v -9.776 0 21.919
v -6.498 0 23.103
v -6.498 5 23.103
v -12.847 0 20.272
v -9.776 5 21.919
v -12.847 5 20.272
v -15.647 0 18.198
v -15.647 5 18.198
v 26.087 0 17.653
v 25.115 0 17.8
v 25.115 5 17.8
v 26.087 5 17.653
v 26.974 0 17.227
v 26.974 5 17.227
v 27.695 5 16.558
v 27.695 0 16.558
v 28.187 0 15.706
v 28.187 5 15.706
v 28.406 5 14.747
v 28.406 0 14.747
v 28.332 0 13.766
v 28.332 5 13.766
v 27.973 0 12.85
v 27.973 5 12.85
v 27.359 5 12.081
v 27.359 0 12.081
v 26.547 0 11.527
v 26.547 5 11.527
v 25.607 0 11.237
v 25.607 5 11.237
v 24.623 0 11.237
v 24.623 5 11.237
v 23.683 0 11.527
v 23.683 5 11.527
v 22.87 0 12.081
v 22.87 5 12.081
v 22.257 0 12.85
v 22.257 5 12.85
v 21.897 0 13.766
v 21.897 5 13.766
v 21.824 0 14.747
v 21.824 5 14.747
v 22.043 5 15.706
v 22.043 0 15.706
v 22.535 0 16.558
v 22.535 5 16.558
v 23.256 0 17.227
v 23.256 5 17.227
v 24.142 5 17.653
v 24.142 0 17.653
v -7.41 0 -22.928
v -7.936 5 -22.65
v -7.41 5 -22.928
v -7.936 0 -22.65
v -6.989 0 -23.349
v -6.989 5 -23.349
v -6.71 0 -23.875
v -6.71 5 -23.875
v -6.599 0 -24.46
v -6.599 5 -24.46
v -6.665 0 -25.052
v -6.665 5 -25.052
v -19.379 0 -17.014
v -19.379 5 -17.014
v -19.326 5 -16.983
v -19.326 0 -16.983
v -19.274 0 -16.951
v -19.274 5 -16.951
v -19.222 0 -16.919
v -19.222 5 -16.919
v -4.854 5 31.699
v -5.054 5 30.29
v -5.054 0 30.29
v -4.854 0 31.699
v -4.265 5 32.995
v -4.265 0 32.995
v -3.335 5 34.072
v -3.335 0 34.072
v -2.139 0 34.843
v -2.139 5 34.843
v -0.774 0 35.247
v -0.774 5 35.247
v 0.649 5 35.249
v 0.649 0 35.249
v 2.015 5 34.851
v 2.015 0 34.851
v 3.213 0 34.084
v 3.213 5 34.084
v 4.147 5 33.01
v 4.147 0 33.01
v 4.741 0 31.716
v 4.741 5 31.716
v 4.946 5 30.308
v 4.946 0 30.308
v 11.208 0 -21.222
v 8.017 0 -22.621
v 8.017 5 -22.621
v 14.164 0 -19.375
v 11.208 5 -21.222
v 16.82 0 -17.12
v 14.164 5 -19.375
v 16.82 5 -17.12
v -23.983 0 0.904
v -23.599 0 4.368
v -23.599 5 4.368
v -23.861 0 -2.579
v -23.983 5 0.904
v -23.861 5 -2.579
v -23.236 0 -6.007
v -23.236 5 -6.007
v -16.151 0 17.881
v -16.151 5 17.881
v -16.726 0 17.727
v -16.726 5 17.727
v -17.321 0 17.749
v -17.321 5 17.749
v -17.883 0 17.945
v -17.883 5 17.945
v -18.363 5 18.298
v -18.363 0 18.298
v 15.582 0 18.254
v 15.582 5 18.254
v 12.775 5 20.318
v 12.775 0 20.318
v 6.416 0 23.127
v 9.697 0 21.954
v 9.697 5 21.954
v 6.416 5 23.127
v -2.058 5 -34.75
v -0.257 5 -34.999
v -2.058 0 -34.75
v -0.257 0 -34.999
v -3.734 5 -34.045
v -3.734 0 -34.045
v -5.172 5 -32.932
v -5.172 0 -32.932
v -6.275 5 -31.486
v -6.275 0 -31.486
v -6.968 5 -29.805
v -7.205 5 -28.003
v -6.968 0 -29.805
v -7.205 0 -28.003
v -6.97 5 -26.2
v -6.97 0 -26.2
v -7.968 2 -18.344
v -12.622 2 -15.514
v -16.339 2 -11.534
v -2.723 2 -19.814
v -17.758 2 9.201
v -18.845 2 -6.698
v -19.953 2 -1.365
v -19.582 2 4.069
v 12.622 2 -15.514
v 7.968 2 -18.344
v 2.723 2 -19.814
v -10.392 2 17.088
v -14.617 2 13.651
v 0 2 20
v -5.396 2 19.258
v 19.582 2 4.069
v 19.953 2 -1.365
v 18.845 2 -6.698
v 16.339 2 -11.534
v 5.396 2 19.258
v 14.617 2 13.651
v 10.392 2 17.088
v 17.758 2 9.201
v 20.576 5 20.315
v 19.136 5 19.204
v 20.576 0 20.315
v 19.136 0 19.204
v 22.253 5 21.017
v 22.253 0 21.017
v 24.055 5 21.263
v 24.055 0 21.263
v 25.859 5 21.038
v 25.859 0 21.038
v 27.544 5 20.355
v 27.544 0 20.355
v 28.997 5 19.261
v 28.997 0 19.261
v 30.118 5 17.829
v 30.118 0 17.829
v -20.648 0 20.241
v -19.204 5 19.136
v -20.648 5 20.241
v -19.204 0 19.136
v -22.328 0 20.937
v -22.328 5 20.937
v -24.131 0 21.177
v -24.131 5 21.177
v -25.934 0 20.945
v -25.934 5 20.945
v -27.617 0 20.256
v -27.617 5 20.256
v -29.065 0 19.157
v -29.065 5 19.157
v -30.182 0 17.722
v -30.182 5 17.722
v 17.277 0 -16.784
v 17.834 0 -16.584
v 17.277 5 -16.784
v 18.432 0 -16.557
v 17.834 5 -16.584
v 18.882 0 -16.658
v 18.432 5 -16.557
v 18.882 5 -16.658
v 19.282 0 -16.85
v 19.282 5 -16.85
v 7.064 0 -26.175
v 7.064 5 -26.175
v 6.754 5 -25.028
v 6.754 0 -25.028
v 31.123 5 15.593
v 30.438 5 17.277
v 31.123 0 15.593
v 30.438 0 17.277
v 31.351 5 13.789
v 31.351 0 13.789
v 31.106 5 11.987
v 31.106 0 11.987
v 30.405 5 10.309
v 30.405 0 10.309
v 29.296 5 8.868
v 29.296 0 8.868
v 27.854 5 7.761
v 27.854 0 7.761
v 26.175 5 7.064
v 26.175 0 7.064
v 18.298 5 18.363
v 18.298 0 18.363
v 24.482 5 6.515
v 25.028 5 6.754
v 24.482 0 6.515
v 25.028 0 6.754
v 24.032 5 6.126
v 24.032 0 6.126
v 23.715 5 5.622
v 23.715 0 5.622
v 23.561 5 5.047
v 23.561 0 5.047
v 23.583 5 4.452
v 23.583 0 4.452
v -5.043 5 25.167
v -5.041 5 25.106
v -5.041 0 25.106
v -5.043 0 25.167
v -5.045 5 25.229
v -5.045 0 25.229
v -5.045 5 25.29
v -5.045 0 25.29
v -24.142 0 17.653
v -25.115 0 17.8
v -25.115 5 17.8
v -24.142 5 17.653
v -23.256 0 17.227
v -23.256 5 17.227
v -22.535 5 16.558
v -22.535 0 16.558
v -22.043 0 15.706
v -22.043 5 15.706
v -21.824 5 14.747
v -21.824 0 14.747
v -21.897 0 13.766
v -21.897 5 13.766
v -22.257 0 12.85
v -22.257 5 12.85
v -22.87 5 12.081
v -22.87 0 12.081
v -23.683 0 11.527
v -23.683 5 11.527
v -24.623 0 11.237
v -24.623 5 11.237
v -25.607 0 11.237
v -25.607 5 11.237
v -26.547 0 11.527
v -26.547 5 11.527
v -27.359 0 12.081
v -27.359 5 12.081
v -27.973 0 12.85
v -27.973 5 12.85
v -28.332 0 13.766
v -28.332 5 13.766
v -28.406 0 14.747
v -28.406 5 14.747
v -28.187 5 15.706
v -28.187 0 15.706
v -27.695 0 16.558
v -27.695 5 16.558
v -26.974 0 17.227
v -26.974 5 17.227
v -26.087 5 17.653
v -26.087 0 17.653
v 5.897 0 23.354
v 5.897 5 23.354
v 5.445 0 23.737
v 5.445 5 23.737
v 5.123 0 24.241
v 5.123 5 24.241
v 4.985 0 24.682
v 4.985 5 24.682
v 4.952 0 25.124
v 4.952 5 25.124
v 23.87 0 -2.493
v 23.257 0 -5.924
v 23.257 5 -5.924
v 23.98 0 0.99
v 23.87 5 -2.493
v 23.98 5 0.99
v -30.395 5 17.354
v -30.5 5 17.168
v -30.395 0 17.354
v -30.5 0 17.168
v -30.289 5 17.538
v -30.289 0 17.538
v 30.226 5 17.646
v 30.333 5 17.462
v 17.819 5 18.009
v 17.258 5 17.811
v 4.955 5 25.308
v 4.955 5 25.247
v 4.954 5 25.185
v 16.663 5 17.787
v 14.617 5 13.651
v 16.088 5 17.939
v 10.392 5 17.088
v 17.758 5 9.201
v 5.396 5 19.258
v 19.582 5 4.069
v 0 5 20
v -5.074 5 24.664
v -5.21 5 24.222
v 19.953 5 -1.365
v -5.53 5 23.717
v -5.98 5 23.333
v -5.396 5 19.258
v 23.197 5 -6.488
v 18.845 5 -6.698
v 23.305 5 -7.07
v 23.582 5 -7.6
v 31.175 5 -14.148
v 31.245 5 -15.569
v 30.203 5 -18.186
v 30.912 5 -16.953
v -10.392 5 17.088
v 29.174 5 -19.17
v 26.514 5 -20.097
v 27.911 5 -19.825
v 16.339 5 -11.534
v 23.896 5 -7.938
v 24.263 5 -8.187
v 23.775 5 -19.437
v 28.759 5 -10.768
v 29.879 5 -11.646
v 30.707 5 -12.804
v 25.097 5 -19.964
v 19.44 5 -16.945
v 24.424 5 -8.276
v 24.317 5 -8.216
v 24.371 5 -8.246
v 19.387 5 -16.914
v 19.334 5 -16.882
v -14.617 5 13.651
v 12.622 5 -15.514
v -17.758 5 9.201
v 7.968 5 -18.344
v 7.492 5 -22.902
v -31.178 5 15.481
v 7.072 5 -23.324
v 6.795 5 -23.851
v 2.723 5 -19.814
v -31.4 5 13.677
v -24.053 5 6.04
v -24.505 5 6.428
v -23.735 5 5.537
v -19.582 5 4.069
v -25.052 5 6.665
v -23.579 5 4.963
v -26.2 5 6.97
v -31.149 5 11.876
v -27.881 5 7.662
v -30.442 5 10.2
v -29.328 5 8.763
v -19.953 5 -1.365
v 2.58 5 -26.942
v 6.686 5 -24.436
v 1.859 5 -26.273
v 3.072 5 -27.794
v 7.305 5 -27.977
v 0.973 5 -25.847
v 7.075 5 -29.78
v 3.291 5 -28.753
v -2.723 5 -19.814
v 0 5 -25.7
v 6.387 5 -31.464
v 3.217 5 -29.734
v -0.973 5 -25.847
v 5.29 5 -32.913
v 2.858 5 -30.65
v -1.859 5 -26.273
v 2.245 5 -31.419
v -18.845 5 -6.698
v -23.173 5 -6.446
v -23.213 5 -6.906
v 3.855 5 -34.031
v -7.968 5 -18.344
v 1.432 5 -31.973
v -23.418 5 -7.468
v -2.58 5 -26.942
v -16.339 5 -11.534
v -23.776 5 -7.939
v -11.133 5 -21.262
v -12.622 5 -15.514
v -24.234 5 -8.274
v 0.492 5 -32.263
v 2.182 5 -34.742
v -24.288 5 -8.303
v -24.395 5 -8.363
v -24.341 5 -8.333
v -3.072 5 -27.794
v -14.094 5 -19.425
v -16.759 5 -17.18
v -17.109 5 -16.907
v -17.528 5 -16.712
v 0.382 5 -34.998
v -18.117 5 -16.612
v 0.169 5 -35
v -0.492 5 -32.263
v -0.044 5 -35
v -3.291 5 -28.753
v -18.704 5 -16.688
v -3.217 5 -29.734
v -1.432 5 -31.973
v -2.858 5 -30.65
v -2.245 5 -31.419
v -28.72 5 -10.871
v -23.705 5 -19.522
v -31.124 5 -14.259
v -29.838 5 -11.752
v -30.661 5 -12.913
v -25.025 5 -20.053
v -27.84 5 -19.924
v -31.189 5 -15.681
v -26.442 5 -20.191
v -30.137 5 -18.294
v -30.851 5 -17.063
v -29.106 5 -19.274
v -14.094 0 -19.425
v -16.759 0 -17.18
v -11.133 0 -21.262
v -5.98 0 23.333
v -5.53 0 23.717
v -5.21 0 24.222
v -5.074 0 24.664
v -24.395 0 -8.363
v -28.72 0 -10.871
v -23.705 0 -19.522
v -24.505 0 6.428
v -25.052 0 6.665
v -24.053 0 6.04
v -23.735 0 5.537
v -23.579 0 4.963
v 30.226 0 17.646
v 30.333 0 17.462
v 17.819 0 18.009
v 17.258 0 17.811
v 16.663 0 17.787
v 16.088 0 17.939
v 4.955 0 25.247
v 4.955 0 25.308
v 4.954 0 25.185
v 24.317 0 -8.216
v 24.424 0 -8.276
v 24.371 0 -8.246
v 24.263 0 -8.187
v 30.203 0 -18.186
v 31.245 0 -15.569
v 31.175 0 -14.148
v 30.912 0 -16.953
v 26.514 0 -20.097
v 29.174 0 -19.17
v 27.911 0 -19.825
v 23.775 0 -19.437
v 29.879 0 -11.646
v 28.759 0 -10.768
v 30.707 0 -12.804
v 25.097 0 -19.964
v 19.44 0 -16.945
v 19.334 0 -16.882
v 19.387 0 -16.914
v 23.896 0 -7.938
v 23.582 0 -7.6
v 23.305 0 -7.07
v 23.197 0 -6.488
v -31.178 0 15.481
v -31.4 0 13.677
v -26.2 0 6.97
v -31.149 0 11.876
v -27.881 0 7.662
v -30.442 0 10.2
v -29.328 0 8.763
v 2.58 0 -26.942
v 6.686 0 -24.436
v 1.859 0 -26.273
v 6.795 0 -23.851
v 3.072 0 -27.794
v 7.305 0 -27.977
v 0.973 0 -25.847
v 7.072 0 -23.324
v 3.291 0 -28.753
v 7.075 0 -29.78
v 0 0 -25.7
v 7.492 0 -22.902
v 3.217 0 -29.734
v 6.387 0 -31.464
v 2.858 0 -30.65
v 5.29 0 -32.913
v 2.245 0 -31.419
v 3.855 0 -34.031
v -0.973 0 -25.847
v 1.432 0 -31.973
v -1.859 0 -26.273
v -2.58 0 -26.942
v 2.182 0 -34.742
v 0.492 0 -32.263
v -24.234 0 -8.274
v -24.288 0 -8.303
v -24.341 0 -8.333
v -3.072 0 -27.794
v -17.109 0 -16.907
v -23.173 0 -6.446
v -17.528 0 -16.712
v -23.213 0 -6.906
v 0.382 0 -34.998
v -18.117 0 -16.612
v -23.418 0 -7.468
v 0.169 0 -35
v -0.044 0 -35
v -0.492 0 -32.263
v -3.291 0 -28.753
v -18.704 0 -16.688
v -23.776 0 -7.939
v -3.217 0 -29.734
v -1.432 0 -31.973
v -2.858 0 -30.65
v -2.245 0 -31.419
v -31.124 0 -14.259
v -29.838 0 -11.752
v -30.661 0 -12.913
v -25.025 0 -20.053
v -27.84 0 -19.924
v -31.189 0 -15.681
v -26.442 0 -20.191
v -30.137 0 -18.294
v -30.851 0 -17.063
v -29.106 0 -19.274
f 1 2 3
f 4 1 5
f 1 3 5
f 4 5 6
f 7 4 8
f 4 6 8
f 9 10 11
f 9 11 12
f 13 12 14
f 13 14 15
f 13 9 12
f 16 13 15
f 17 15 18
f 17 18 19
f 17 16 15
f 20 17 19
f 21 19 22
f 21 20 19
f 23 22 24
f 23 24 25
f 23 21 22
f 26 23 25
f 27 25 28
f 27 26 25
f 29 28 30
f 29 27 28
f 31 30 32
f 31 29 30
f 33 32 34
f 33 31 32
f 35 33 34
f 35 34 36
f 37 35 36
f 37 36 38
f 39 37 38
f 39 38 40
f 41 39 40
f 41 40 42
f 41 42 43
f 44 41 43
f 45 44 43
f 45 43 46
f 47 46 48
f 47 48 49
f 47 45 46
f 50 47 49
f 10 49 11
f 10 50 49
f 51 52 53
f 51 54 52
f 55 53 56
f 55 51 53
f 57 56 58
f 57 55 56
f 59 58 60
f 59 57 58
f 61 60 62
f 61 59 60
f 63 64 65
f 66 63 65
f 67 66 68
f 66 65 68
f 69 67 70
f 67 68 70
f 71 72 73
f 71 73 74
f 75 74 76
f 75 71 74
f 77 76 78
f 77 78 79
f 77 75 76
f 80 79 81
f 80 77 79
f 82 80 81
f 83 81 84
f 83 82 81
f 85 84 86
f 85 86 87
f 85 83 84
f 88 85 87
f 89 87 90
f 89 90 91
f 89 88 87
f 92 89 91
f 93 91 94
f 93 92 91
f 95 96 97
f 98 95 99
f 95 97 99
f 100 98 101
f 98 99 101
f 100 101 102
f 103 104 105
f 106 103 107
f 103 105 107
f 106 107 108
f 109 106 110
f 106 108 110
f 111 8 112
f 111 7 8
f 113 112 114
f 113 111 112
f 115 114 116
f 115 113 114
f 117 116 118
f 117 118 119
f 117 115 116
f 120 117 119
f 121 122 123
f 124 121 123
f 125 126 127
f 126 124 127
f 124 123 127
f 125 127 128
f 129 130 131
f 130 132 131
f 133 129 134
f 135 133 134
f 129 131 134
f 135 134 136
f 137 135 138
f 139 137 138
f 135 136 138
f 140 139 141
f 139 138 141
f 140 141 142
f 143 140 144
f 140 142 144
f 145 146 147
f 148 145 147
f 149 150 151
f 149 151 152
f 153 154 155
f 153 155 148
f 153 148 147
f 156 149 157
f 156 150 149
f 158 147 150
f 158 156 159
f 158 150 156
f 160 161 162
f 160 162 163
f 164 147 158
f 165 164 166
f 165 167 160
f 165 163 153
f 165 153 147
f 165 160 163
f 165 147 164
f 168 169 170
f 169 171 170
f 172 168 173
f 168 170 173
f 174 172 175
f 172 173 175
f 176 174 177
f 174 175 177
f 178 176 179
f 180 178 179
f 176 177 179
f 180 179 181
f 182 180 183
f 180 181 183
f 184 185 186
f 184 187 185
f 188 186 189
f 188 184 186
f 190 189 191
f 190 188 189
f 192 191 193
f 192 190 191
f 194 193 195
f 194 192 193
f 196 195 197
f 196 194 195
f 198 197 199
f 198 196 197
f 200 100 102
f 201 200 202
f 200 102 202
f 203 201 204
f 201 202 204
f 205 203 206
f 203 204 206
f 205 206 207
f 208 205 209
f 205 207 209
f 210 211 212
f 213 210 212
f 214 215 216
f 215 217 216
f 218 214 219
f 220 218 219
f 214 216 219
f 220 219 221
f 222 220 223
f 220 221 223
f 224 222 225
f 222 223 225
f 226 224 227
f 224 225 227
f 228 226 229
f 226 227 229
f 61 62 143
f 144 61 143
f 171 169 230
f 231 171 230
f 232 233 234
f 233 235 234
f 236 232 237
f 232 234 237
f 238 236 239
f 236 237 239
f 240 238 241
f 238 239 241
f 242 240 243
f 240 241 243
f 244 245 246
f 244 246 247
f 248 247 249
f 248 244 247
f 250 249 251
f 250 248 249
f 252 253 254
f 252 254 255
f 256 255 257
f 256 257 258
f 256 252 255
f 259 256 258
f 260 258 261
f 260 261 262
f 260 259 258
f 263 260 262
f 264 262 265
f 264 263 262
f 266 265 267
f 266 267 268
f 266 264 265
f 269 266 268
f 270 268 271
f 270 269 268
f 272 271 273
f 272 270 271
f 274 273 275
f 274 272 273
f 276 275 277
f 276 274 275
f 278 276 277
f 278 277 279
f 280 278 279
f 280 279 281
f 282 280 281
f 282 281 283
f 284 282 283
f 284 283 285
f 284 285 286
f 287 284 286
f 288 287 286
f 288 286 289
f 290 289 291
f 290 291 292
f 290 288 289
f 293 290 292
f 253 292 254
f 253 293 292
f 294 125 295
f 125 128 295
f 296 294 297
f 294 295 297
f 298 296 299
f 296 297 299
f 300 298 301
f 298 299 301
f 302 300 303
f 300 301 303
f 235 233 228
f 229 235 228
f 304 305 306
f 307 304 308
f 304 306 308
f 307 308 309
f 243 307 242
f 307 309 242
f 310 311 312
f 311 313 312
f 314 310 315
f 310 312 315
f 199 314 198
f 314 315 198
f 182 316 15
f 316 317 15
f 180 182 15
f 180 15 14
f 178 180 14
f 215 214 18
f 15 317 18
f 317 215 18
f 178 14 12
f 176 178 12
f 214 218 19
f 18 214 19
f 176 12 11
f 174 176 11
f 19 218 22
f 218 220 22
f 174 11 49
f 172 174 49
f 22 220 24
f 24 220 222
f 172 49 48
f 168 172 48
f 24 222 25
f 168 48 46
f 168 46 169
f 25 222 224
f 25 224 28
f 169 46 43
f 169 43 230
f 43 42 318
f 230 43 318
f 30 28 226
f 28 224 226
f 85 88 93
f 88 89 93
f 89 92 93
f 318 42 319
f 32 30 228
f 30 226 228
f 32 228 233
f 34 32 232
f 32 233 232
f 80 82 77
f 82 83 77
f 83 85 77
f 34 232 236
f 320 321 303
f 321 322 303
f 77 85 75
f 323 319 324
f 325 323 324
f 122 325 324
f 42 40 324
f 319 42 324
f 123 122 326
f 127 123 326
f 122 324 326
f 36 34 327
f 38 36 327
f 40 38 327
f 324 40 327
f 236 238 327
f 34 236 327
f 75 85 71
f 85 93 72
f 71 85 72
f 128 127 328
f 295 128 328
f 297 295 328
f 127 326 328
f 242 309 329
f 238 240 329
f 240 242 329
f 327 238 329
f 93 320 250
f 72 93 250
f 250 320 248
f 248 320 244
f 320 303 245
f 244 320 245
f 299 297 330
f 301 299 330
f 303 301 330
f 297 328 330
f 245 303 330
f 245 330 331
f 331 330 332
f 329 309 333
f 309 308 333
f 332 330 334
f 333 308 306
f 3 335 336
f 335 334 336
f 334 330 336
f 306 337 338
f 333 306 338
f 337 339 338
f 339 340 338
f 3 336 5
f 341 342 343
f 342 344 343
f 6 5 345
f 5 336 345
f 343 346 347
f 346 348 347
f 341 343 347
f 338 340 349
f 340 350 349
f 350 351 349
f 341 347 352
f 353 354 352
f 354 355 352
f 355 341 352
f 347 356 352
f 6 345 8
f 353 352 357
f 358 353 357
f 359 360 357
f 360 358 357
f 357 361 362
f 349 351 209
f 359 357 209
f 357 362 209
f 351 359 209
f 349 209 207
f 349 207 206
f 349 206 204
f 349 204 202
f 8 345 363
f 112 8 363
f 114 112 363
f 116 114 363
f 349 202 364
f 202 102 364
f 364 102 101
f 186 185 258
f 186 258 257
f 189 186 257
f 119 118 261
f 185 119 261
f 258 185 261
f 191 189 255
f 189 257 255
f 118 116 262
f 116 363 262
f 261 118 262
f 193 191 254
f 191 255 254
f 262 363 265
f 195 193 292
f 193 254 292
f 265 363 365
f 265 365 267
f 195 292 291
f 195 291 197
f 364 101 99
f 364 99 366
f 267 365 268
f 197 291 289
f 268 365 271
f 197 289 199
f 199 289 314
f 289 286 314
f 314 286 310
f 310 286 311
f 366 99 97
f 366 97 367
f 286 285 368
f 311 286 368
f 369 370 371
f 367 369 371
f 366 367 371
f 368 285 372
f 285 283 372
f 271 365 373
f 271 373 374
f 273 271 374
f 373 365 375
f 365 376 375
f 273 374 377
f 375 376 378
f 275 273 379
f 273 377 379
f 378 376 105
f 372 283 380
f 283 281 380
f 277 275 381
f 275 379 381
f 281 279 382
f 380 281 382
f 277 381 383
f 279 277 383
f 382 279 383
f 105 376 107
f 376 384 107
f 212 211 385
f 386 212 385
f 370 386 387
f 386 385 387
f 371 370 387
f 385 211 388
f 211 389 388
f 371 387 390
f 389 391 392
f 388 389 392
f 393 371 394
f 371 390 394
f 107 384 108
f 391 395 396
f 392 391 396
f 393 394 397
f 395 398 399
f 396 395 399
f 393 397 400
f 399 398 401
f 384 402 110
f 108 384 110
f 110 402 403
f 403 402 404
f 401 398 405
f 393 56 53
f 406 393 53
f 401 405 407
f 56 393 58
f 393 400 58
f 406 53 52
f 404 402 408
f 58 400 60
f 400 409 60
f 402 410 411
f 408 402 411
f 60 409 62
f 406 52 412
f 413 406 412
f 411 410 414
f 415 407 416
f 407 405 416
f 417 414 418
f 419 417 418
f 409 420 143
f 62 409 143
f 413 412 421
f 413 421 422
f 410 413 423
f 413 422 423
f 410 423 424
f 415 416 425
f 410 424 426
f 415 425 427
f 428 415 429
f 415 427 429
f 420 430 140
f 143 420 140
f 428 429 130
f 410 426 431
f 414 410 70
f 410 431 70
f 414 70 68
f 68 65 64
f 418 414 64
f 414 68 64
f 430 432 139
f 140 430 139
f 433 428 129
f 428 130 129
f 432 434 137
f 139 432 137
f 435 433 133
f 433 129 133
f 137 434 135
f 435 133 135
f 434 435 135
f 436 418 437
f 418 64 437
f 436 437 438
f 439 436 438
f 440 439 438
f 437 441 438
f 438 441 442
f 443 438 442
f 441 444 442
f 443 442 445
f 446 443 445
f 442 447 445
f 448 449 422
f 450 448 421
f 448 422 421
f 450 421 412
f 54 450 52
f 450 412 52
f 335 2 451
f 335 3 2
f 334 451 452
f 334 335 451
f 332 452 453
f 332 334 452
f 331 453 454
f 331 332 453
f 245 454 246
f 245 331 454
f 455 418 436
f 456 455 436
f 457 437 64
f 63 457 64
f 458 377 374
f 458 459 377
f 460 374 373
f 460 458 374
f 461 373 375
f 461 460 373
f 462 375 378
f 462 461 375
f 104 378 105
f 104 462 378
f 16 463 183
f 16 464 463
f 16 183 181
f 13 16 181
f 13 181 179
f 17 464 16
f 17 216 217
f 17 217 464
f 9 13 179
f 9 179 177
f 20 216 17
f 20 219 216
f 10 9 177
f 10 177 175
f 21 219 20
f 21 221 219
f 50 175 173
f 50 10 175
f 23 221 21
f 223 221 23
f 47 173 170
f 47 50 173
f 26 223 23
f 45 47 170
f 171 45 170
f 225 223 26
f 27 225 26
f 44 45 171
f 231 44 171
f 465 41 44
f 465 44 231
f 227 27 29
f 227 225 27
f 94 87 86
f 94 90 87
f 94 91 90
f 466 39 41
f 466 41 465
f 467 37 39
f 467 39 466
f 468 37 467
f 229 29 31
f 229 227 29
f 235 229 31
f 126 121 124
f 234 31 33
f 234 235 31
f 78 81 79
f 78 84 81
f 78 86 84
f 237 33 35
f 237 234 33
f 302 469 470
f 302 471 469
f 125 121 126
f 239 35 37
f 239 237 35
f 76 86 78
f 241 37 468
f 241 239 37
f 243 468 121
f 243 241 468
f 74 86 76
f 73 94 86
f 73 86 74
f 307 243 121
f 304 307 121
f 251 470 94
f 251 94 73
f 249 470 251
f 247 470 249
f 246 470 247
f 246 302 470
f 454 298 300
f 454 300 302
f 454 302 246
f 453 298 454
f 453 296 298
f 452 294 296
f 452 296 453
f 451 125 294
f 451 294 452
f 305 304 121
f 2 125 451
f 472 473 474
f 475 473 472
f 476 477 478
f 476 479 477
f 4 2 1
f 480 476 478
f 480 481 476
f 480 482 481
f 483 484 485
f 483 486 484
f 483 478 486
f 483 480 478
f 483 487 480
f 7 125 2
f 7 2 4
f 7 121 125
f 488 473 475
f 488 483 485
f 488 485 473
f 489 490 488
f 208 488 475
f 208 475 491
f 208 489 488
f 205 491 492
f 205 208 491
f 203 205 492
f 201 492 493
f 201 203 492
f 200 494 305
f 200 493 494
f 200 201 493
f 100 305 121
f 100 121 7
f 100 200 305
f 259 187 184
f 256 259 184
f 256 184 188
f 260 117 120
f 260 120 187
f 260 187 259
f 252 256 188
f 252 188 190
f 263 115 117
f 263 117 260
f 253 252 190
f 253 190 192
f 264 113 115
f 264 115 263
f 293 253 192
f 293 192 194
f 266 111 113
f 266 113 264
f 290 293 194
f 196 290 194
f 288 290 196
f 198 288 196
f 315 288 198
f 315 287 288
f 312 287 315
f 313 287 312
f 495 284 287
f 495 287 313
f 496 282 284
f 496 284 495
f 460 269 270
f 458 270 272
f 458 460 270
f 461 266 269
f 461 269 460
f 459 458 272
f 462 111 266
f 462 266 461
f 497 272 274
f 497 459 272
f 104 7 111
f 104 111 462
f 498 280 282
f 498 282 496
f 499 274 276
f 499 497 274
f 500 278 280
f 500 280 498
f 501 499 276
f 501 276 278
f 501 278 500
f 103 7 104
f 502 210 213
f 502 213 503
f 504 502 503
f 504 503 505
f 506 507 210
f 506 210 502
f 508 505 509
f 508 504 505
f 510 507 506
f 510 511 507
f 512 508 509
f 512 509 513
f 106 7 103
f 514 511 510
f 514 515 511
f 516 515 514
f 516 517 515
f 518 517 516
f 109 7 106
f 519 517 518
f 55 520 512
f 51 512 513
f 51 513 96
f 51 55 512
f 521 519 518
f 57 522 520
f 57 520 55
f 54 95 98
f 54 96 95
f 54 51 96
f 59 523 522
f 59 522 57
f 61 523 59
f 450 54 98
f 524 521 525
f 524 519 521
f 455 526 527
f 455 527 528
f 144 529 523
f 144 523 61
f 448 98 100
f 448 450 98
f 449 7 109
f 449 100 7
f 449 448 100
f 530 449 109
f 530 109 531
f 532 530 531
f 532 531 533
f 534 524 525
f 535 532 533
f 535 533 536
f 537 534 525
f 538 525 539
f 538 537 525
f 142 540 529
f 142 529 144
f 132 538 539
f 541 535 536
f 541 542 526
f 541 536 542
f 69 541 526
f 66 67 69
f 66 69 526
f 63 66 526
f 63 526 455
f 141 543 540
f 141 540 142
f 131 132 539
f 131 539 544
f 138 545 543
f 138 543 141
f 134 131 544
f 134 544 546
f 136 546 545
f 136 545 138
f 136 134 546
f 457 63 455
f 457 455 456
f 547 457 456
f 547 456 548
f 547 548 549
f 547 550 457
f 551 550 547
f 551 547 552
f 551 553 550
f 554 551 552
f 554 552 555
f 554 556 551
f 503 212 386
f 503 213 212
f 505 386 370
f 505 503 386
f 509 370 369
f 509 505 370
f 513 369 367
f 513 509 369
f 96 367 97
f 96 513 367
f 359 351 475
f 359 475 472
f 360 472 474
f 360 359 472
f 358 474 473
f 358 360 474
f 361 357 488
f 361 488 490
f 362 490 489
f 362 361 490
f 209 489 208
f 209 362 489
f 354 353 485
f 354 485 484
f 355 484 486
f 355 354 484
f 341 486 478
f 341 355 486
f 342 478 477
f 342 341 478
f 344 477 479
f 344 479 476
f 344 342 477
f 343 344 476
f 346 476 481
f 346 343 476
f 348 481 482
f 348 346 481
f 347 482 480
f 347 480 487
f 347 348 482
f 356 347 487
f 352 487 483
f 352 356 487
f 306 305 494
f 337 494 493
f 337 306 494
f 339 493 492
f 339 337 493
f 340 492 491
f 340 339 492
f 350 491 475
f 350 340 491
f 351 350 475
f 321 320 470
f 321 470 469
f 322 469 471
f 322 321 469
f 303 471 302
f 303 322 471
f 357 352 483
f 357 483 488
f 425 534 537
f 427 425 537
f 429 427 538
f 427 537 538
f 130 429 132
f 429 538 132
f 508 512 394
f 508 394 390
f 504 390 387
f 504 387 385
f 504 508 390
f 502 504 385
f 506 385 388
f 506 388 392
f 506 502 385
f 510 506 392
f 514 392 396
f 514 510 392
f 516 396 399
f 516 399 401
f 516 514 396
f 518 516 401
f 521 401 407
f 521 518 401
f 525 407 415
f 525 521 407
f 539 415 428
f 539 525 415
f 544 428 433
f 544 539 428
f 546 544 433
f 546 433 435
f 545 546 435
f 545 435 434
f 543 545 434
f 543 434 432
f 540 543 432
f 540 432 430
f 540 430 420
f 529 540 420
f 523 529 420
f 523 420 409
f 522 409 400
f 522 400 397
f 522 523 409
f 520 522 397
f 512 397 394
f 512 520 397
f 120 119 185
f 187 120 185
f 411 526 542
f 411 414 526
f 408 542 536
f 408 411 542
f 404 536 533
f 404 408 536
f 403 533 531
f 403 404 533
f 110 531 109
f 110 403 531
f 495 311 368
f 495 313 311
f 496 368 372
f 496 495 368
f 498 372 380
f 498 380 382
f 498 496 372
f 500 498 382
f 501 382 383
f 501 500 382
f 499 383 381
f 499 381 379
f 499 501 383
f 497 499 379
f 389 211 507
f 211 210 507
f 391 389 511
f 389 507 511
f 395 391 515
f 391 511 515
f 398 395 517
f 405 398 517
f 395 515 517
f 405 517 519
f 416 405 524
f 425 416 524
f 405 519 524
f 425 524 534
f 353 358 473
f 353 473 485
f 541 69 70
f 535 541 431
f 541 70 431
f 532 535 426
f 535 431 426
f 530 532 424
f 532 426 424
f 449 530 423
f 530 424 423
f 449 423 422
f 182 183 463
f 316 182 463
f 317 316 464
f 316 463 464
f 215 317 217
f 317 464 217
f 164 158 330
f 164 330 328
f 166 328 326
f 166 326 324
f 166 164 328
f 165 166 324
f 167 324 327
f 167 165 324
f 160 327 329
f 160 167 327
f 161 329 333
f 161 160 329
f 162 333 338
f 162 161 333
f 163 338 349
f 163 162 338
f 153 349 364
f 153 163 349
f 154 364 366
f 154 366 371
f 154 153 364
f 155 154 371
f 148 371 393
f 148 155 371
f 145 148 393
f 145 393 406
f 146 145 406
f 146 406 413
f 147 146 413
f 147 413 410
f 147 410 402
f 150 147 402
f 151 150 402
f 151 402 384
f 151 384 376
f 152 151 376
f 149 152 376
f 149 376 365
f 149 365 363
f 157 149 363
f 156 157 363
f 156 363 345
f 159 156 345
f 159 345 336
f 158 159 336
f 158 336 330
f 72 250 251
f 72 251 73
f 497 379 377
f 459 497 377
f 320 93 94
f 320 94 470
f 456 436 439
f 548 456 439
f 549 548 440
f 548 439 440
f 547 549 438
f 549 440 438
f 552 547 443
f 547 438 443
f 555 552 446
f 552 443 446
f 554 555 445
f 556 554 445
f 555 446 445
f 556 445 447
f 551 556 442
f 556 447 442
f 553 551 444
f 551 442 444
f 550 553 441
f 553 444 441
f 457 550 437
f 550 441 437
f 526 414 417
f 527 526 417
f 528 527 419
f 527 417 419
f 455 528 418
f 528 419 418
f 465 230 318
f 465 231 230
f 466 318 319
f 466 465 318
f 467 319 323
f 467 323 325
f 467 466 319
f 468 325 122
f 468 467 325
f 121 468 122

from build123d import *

# Parameters (mm, degrees)
SKETCH1_R           = 20
BOSS_EXTRUDE1_DEPTH = 2
SKETCH2_R           = 35
SKETCH2_R_2         = 20
SKETCH2_R_3         = 3.3
BOSS_EXTRUDE2_DEPTH = 5
CUT_EXTRUDE1_DEPTH  = 10
FILLET1_R           = 2
FILLET2_R           = 7
BOSS_EXTRUDE3_DEPTH = 5
FILLET3_R           = 2


with BuildPart() as part:
    # Sketch1 → Boss-Extrude1 (new body)
    with BuildSketch(Plane(origin=(0, 0, 0), x_dir=(1, 0, 0), z_dir=(0, 1, 0))):
        with Locations(Location((0, 0, 0), (0, 0, 270))):
            Circle(SKETCH1_R)
    extrude(amount=BOSS_EXTRUDE1_DEPTH)

    # Sketch2 → Boss-Extrude2 (add)
    with BuildSketch(Plane(origin=(0, 0, 0), x_dir=(1, 0, 0), z_dir=(0, 1, 0))):
        with Locations(Location((0, 0, 0), (0, 0, 270))):
            Circle(SKETCH2_R)
        with Locations(Location((0, 0, 0), (0, 0, 270))):
            Circle(SKETCH2_R_2, mode=Mode.SUBTRACT)
        with Locations(Location((0, 29, 0), (0, 0, 270))):
            Circle(SKETCH2_R_3, mode=Mode.SUBTRACT)
        with Locations(Location((25.11473671, -14.5, 0), (0, 0, 270))):
            Circle(SKETCH2_R_3, mode=Mode.SUBTRACT)
        with Locations(Location((-25.11473671, -14.5, 0), (0, 0, 270))):
            Circle(SKETCH2_R_3, mode=Mode.SUBTRACT)
    extrude(amount=BOSS_EXTRUDE2_DEPTH)

    # Sketch3 → Cut-Extrude1 (cut)
    with BuildSketch(Plane(origin=(0, 5, 0), x_dir=(1, 0, 0), z_dir=(0, 1, 0))):
        with BuildLine():
            ThreePointArc((-23.193270109, -6.170269172), (-20.763157745, 12.037079399), (-6.170269172, 23.193270109))
            Line((-6.170269172, 23.193270109), (-14.951119735, 56.199389167))
            Line((-14.951119735, 56.199389167), (-49.377364183, -13.136208329))
            Line((-49.377364183, -13.136208329), (-23.193270109, -6.170269172))
        make_face()
        with BuildLine():
            Line((13.312391969, 49.330155919), (6.253025204, 23.171095697))
            ThreePointArc((6.253025204, 23.171095697), (20.805995419, 11.96288237), (23.171095697, -6.253025204))
            Line((23.171095697, -6.253025204), (56.145658563, -15.151645078))
            Line((56.145658563, -15.151645078), (13.312391969, 49.330155919))
        make_face()
        with BuildLine():
            Line((36.064972214, -36.193947589), (16.940244905, -17.000826525))
            ThreePointArc((16.940244905, -17.000826525), (-0.042837674, -23.999961769), (-17.000826525, -16.940244905))
            Line((-17.000826525, -16.940244905), (-41.194538828, -41.047744089))
            Line((-41.194538828, -41.047744089), (36.064972214, -36.193947589))
        make_face()
    extrude(amount=-CUT_EXTRUDE1_DEPTH, mode=Mode.SUBTRACT)

    # Fillet1
    fillet1_edges = [part.edges().sort_by_distance(p)[0] for p in [
        (16.940244905, 2.5, 17.000826525),
        (-17.000826525, 2.5, 16.940244905),
        (6.253025204, 2.5, -23.171095697),
        (23.171095697, 2.5, 6.253025204),
        (-6.170269172, 2.5, -23.193270109),
        (-23.193270109, 2.5, 6.170269172),
    ]]
    fillet(fillet1_edges, radius=FILLET1_R)

    # Fillet2
    fillet2_edges = [part.edges().sort_by_distance(p)[0] for p in [
        (-24.792872016, 2.5, 24.70452382),
        (24.70452382, 2.5, 24.792872016),
        (33.791181225, 2.5, 9.118995089),
        (9.118995089, 2.5, -33.791181225),
        (-8.998309209, 2.5, -33.823518909),
        (-33.823518909, 2.5, 8.998309209),
    ]]
    fillet(fillet2_edges, radius=FILLET2_R)

    # Sketch4 → Boss-Extrude3 (add)
    with BuildSketch(Plane(origin=(0, 5, 0), x_dir=(1, 0, 0), z_dir=(0, 1, 0))):
        with BuildLine():
            Line((-23.70496499, 19.52200868), (-19.379307126, 17.014283806))
            ThreePointArc((-19.379307126, 17.014283806), (-17.561374138, 10.180901067), (-24.394756876, 8.362968079))
            Line((-24.394756876, 8.362968079), (-28.720414739, 10.870692953))
            ThreePointArc((-28.720414739, 10.870692953), (-30.538347728, 17.704075692), (-23.70496499, 19.52200868))
        make_face()
        with BuildLine():
            Line((23.774503624, 19.437262295), (19.439921245, 16.944995134))
            ThreePointArc((19.439921245, 16.944995134), (17.597606027, 10.118145595), (24.424455566, 8.275830376))
            Line((24.424455566, 8.275830376), (28.759037945, 10.768097537))
            ThreePointArc((28.759037945, 10.768097537), (30.601353164, 17.594947076), (23.774503624, 19.437262295))
        make_face()
        with BuildLine():
            Line((4.945911115, -30.307955248), (4.954835631, -25.307963213))
            ThreePointArc((4.954835631, -25.307963213), (-0.036231889, -20.299046662), (-5.04514844, -25.290114182))
            Line((-5.04514844, -25.290114182), (-5.054072955, -30.290106217))
            ThreePointArc((-5.054072955, -30.290106217), (-0.063005435, -35.299022768), (4.945911115, -30.307955248))
        make_face()
    extrude(amount=-BOSS_EXTRUDE3_DEPTH)

    # Fillet3
    fillet3_edges = [part.edges().sort_by_distance(p)[0] for p in [
        (-18.017295098, 2.5, -15.854875507),
        (-22.711825842, 2.5, -7.757123623),
        (22.739372512, 2.5, -7.675997509),
        (18.073779039, 2.5, -15.790456334),
        (-4.722077413, 2.5, 23.530873016),
        (4.638046803, 2.5, 23.547579957),
    ]]
    fillet(fillet3_edges, radius=FILLET3_R)


solid = part.part
